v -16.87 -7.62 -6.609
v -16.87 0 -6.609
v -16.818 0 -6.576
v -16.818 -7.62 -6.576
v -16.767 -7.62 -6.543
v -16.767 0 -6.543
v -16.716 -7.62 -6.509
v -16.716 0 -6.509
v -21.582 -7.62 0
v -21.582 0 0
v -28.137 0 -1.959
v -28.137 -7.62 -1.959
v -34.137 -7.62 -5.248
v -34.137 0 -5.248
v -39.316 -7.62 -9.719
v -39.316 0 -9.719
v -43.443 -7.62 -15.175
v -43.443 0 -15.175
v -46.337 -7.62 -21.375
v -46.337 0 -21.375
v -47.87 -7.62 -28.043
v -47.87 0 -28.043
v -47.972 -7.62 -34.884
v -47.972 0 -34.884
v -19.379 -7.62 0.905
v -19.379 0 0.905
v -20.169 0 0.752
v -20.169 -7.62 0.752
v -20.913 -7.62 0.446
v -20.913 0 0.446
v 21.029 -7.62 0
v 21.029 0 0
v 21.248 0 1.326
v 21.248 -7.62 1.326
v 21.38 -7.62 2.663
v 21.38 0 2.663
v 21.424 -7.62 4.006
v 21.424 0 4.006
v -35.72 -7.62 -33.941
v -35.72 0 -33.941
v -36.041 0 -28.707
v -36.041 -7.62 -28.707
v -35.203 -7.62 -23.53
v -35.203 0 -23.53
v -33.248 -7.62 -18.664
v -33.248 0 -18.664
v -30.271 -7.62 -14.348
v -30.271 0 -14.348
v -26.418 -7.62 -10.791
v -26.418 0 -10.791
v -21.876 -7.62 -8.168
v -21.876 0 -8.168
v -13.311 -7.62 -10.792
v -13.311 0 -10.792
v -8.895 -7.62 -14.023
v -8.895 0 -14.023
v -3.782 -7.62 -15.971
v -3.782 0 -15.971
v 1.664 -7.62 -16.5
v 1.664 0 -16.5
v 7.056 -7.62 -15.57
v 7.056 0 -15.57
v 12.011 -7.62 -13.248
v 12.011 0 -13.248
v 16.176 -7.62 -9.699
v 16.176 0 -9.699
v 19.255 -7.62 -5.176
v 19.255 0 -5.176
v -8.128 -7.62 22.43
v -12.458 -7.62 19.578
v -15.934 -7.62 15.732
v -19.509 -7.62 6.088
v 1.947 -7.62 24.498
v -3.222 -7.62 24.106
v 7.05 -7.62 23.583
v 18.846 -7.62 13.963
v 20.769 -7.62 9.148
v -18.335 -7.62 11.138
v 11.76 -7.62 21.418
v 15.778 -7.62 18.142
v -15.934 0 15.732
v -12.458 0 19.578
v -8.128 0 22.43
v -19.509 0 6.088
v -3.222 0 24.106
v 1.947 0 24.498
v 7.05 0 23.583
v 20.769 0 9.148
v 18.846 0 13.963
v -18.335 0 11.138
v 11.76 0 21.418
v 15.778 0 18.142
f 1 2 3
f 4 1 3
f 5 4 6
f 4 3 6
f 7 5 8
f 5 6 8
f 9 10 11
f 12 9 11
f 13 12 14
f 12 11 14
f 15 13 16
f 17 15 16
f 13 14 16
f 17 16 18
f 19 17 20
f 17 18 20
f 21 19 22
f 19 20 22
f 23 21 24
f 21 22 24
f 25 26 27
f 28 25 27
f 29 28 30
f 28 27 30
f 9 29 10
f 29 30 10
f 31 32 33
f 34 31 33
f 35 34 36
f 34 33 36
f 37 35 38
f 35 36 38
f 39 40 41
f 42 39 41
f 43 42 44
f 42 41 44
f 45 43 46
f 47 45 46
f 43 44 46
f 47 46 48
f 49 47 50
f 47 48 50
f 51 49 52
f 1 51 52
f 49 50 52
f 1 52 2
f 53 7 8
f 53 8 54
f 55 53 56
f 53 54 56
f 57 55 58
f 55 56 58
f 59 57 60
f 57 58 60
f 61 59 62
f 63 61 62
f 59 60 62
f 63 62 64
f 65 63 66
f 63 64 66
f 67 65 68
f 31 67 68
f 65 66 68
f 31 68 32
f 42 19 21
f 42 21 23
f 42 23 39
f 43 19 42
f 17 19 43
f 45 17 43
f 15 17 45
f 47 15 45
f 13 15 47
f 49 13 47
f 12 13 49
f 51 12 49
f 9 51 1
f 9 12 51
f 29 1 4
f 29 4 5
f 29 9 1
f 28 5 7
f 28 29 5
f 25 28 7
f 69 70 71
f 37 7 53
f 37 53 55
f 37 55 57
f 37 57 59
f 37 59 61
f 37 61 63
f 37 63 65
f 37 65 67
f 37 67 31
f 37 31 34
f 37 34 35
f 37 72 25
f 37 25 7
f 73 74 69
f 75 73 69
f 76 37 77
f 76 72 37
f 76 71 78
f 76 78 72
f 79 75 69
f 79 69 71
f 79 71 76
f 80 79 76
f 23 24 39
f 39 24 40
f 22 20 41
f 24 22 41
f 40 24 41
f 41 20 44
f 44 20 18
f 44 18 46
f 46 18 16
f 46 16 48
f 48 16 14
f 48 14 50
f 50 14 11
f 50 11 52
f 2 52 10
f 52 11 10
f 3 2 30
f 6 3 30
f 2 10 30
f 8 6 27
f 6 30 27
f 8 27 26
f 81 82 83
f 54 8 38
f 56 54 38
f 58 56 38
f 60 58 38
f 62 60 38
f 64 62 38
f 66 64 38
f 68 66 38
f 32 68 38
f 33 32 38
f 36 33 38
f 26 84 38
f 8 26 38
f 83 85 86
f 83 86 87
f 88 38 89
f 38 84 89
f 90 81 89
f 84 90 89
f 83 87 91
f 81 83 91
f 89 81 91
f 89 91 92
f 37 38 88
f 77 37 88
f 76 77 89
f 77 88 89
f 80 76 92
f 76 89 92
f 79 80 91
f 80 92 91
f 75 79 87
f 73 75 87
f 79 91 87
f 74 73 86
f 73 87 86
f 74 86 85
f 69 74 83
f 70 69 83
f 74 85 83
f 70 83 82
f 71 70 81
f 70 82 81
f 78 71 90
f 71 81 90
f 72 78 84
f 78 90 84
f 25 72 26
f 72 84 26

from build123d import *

# Parameters (mm, degrees)
F1_DEPTH = 7.62
F3_DEPTH = 7.62


with BuildPart() as f1:
    # F0 (on Front) → F1 (new body)
    with BuildSketch(Plane.XZ):
        with BuildLine():
            ThreePointArc((21.0290110962, 0), (21.3248501657, 1.9931047456), (21.4237811773, 4.0056155995))
            ThreePointArc((21.4237811773, 4.0056155995), (-1.1080148506, 24.4259697619), (-19.2200190896, 0))
            ThreePointArc((-19.2200190896, 0), (0.9044960033, -16.5136695746), (21.0290110962, 0))
        make_face()
    extrude(amount=F1_DEPTH)

    # F2 (on Front) → F3 (join)
    with BuildSketch(Plane.XZ):
        with BuildLine():
            ThreePointArc((-16.8698355556, -6.6087017767), (-15.6905339278, -0.7832460117), (-21.5823259205, 0))
            ThreePointArc((-21.5823259205, 0), (-41.5234625412, -12.3382675542), (-47.9722805321, -34.8836556077))
            Line((-47.9722805321, -34.8836556077), (-35.7198044658, -33.9411571622))
            ThreePointArc((-35.7198044658, -33.9411571622), (-31.8794663631, -16.423449292), (-16.8698355556, -6.6087017767))
        make_face()
    extrude(amount=F3_DEPTH)


solid = f1.part
